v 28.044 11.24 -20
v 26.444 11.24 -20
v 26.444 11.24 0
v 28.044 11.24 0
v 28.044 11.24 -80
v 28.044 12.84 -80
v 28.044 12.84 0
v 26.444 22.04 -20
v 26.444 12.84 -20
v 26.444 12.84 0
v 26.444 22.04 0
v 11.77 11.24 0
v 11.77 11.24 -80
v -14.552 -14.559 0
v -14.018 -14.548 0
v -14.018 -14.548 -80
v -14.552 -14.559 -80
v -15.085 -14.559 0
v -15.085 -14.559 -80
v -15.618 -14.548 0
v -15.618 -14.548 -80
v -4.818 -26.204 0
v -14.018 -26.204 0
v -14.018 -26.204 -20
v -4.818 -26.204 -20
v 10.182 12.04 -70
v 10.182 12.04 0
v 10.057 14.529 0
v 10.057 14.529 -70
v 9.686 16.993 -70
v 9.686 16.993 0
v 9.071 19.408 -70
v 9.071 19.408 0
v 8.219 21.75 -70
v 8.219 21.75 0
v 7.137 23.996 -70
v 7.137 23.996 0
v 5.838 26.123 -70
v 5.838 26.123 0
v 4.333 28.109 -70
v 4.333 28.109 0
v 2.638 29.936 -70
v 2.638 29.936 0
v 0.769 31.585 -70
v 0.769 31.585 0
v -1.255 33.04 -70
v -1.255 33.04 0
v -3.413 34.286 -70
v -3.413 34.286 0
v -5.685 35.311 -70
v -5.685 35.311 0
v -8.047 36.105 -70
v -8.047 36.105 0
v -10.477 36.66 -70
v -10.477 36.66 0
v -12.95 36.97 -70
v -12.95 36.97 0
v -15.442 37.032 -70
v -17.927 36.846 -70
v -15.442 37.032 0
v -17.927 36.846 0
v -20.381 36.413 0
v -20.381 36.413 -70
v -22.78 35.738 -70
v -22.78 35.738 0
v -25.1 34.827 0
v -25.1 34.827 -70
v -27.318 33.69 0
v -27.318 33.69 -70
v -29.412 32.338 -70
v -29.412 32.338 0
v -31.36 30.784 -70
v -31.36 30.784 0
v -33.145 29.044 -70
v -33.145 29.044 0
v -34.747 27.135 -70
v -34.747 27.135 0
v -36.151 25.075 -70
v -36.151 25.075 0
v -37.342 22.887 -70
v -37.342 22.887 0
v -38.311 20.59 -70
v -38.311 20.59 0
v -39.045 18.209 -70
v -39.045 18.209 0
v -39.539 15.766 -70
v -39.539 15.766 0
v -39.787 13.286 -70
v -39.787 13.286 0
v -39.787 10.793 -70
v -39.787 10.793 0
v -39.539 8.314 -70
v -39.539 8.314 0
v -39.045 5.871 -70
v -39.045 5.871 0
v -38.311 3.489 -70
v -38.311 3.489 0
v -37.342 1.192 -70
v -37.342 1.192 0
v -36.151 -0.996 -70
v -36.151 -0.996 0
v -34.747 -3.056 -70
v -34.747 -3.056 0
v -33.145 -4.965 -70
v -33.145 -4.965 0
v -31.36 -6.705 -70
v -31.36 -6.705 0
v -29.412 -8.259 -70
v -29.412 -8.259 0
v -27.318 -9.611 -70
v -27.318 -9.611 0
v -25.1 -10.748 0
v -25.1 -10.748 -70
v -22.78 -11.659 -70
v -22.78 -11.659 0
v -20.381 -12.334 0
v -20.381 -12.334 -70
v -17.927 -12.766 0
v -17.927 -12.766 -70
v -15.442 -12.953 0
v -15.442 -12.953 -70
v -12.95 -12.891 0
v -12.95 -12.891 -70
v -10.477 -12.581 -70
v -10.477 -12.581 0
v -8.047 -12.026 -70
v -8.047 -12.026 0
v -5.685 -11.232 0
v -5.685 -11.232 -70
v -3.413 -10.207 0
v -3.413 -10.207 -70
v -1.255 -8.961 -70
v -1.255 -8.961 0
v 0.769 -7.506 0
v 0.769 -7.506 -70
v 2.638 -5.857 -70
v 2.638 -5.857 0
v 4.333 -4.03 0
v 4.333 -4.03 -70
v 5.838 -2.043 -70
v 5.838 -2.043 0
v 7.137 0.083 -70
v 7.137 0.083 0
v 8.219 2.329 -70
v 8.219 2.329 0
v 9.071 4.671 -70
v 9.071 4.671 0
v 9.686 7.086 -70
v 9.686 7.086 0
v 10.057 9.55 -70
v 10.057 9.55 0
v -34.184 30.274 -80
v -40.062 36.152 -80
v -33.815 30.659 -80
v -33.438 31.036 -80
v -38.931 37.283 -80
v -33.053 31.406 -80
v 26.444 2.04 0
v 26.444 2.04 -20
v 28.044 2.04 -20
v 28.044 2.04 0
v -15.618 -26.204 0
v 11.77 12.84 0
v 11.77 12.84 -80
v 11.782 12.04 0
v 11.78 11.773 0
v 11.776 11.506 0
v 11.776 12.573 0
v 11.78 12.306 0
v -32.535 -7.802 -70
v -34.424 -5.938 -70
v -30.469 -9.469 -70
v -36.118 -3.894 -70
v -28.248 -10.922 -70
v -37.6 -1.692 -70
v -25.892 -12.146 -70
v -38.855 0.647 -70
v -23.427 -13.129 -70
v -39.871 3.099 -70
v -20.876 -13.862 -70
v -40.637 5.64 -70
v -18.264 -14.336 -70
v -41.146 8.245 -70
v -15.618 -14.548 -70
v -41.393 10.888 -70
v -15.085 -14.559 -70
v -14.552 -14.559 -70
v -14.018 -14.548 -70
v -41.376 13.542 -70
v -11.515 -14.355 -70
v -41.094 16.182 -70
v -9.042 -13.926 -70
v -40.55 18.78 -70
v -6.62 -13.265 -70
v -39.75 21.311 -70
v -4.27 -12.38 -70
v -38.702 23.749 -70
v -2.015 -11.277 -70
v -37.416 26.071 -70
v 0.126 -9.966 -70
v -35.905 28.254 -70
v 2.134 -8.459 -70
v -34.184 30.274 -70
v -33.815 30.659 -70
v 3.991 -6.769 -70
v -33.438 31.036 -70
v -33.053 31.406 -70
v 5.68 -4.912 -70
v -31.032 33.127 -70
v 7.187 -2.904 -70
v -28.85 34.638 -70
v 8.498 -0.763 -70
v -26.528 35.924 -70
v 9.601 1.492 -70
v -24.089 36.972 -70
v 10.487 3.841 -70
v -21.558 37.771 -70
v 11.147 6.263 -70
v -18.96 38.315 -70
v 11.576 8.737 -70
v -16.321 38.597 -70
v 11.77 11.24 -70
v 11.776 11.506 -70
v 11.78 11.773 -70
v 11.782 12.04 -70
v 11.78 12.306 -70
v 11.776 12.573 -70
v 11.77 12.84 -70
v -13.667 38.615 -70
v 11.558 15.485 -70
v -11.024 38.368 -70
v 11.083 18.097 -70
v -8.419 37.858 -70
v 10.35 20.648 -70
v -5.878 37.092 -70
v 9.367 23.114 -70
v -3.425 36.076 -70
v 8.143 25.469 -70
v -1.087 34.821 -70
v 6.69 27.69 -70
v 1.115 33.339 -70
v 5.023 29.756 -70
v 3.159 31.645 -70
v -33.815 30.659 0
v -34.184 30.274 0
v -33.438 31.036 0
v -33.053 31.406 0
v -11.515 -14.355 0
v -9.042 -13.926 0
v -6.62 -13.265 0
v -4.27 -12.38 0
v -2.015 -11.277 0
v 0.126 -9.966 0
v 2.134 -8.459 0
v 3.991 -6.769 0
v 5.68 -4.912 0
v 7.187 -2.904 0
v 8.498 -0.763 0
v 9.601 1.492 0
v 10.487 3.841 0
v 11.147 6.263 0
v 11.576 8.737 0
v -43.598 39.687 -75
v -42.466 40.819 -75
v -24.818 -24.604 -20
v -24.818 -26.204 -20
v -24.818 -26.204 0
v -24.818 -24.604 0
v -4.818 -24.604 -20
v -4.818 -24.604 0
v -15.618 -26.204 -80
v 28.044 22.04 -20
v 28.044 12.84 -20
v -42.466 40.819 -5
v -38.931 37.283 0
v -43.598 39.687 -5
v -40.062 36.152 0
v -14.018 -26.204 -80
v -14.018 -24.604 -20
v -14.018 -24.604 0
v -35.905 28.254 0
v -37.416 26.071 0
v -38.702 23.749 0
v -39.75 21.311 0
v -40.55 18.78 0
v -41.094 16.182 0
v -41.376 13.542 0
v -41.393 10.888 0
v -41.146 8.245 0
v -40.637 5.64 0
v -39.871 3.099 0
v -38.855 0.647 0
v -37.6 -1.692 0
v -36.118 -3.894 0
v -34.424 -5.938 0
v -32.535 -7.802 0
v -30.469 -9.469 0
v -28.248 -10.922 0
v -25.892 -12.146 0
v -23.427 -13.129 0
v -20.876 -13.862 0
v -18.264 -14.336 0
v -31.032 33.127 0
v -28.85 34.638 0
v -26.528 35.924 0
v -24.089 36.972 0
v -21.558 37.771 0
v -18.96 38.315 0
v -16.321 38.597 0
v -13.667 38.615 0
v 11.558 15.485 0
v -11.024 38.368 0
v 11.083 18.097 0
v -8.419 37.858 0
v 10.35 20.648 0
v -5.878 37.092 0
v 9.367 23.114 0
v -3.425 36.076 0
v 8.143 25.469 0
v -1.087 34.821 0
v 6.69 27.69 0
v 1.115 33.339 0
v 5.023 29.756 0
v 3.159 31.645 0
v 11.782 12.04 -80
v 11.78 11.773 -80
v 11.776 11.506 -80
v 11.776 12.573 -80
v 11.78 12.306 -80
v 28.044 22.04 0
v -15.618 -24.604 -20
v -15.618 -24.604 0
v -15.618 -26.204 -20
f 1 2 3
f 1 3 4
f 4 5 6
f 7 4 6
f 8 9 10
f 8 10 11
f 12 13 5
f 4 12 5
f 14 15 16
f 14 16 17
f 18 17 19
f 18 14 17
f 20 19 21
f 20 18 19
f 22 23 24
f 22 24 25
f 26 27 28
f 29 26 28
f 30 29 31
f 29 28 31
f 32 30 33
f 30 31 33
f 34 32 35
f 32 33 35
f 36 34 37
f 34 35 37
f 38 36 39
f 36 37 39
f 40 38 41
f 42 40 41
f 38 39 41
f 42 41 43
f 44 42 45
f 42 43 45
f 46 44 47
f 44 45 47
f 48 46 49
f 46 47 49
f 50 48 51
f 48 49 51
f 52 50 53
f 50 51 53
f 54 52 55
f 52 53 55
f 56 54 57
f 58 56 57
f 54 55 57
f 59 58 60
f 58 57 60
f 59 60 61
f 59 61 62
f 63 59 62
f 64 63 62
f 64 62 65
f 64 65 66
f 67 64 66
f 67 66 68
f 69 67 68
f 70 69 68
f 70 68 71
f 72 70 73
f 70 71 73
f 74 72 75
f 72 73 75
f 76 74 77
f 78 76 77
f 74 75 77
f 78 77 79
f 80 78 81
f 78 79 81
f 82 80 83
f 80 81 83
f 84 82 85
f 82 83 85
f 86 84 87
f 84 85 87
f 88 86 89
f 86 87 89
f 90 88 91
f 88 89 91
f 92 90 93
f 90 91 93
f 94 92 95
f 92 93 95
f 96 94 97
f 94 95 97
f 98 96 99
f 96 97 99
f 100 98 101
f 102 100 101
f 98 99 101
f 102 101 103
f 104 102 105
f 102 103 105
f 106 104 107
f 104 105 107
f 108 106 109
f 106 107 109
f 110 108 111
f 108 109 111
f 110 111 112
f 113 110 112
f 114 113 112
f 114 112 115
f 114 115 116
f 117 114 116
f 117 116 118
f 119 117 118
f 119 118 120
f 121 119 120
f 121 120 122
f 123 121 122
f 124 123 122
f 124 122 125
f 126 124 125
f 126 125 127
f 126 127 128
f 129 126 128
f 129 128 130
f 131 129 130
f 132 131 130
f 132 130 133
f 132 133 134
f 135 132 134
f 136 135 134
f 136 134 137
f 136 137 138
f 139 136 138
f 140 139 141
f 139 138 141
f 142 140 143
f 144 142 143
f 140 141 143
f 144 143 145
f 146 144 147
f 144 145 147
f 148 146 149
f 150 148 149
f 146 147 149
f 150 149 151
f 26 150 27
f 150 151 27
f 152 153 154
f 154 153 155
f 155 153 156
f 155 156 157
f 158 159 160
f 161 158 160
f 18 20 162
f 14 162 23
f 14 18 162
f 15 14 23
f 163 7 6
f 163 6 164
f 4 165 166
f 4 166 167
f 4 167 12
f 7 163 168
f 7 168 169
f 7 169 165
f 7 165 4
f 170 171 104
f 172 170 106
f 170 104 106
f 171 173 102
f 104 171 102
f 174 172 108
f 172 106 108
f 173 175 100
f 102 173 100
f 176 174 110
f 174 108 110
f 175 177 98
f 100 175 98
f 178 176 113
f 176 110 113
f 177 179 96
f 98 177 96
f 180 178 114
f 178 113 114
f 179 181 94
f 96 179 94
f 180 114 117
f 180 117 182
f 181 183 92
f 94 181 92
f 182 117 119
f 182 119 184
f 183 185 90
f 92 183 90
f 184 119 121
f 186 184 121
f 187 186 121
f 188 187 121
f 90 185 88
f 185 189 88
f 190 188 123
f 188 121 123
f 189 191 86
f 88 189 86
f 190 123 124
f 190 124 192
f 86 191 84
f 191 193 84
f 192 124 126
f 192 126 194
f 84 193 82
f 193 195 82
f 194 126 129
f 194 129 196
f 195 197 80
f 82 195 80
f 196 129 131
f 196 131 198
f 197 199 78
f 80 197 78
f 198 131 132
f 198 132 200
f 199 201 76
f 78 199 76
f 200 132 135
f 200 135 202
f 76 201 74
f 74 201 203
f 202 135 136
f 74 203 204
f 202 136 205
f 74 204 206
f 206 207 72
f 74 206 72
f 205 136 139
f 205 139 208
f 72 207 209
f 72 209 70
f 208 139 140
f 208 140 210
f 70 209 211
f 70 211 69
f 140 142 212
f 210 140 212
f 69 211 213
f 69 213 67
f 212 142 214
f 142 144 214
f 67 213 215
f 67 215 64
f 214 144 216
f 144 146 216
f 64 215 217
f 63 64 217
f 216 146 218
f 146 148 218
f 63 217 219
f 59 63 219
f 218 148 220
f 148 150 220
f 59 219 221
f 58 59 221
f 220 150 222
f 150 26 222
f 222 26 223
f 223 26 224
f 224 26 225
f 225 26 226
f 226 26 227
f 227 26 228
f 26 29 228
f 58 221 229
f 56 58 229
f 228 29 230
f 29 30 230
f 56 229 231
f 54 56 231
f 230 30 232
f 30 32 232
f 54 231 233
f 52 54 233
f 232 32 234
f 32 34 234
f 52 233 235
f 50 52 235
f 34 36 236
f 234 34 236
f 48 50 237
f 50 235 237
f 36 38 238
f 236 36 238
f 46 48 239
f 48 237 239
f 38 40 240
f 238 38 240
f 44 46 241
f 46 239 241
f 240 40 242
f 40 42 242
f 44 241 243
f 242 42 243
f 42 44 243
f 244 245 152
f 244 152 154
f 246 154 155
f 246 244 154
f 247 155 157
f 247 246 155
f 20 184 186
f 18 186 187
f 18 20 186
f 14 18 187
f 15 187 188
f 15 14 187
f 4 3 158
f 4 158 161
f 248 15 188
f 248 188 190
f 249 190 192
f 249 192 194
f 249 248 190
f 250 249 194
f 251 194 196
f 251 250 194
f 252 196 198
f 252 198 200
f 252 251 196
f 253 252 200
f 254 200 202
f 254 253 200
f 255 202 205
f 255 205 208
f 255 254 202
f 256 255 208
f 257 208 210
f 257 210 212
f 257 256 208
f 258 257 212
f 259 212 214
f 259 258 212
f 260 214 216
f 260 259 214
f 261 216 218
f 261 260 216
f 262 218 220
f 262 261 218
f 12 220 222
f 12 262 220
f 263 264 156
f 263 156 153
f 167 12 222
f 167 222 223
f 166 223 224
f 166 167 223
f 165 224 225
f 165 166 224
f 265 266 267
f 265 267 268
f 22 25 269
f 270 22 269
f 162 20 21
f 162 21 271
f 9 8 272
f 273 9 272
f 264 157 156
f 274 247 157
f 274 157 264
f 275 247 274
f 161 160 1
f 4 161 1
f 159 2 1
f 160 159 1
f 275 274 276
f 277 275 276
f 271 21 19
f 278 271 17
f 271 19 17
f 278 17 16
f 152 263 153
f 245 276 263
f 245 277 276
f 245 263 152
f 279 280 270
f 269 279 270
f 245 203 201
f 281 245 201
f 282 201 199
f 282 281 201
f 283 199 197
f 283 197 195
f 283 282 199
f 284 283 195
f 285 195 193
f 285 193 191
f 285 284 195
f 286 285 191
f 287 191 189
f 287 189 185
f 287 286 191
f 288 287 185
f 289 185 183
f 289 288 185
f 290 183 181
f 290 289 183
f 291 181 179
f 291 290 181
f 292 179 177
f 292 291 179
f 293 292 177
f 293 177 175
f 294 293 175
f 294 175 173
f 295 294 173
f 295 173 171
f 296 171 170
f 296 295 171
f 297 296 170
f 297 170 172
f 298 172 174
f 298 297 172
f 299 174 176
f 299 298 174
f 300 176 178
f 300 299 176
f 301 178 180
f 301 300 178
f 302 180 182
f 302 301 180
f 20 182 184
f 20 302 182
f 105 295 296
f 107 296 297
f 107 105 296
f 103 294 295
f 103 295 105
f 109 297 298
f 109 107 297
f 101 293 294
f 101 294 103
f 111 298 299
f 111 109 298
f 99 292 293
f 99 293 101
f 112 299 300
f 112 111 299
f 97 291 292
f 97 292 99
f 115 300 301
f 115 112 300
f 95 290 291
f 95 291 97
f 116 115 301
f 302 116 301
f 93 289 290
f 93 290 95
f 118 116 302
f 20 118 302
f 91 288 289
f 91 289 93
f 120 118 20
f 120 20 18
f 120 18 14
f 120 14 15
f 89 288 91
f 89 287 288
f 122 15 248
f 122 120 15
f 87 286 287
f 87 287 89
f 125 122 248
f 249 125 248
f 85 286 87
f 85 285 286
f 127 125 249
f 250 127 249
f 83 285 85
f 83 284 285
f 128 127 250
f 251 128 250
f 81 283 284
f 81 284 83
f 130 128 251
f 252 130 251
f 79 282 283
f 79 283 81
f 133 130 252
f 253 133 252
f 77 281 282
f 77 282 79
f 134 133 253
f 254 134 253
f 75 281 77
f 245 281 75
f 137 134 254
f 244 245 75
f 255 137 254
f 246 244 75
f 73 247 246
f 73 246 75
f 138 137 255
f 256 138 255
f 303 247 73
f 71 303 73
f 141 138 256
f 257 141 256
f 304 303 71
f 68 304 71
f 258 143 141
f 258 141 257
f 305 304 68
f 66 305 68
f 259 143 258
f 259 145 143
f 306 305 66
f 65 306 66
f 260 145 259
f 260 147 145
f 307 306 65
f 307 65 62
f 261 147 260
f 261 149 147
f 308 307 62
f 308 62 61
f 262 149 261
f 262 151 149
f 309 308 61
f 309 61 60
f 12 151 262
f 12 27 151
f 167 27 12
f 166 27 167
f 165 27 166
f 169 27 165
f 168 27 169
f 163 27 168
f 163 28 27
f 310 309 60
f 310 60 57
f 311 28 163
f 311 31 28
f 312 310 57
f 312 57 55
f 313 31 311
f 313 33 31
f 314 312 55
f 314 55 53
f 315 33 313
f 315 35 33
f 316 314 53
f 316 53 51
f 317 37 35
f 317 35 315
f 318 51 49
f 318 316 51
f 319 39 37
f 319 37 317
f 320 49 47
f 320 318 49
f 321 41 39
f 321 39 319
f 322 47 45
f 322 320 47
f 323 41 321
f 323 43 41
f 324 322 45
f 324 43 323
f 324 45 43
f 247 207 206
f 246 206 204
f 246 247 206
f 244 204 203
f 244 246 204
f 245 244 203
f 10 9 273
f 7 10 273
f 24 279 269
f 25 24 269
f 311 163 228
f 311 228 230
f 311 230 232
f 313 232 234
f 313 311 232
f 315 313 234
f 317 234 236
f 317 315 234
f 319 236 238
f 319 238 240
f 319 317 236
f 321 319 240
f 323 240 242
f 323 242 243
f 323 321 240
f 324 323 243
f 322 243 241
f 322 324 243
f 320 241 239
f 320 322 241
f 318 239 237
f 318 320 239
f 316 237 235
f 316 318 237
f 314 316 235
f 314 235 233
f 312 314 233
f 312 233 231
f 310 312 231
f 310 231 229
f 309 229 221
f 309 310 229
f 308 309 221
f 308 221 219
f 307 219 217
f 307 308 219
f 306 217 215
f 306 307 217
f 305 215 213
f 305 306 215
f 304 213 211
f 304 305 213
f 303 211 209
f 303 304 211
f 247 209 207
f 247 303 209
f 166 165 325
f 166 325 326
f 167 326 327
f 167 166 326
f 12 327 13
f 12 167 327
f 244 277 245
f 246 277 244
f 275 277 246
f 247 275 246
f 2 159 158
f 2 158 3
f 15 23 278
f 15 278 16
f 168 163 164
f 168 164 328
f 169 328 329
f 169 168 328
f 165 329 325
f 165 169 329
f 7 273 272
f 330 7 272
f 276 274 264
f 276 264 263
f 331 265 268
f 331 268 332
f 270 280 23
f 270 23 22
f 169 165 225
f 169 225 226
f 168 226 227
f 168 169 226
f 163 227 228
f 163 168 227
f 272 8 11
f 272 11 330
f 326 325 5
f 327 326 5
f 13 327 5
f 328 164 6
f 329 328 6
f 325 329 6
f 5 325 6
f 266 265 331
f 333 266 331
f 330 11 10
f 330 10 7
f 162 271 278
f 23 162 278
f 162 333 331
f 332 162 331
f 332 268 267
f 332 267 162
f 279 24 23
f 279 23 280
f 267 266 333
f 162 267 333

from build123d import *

# Parameters (mm, degrees)
F1_DEPTH = 80
F0_W     = 1.6
F0_H     = 1.6
F0_R     = 25
F2_DEPTH = 70
F3_SIZE  = 5
F0_W_2   = 9.2
F4_DEPTH = 20
F0_H_2   = 9.2


with BuildPart() as f1:
    # F0 (on Top) → F1 (new body)
    with BuildSketch(Plane.XY):
        with BuildLine():
            ThreePointArc((-34.1844936712, 30.2744241403), (-33.6273167185, 30.8486180375), (-33.0531228213, 31.4057949902))
            Line((-33.0531228213, 31.4057949902), (-42.4661514833, 40.8188236522))
            Line((-42.4661514833, 40.8188236522), (-43.5975223332, 39.6874528023))
            Line((-43.5975223332, 39.6874528023), (-34.1844936712, 30.2744241403))
        make_face()
    extrude(amount=-F1_DEPTH)

    # F3
    f3_edges = [f1.edges().sort_by_distance(p)[0] for p in [
        (-43.031837, 40.253138, -80),
        (-43.031837, 40.253138, 0),
    ]]
    chamfer(f3_edges, length=F3_SIZE)


with BuildPart() as f1b:
    # F0 (on Top) → F1, piece 2 (new body)
    with BuildSketch(Plane.XY):
        with BuildLine():
            Line((-14.0182763389, -24.6038896912), (-14.0182763389, -14.5483895453))
            ThreePointArc((-14.0182763389, -14.5483895453), (-14.8182763389, -14.5604223421), (-15.6182763389, -14.5483895453))
            Line((-15.6182763389, -14.5483895453), (-15.6182763389, -24.6038896912))
            Line((-15.6182763389, -24.6038896912), (-14.0182763389, -24.6038896912))
        make_face()
        with Locations((-14.8182763389, -25.4038896912)):
            Rectangle(F0_W, F0_H)
    extrude(amount=-F1_DEPTH)


with BuildPart() as f1c:
    # F0 (on Top) → F1, piece 3 (new body)
    with BuildSketch(Plane.XY):
        with BuildLine():
            ThreePointArc((11.7696908643, 12.8395776579), (11.7787152918, 12.4396229017), (11.7817236611, 12.0395776579))
            ThreePointArc((11.7817236611, 12.0395776579), (11.7787152918, 11.6395324142), (11.7696908643, 11.2395776579))
            Line((11.7696908643, 11.2395776579), (26.4436644382, 11.2395776579))
            Line((26.4436644382, 11.2395776579), (26.4436644382, 12.8395776579))
            Line((26.4436644382, 12.8395776579), (11.7696908643, 12.8395776579))
        make_face()
        with Locations((27.2436644382, 12.0395776579)):
            Rectangle(F0_W, F0_H)
    extrude(amount=-F1_DEPTH)


with BuildPart() as f2:
    # F0 (on Top) → F2 (new body)
    with BuildSketch(Plane.XY):
        with BuildLine():
            ThreePointArc((11.7696908643, 11.2395776579), (11.7787152918, 11.6395324142), (11.7817236611, 12.0395776579))
            ThreePointArc((11.7817236611, 12.0395776579), (11.7787152918, 12.4396229017), (11.7696908643, 12.8395776579))
            ThreePointArc((11.7696908643, 12.8395776579), (-4.638897038, 36.6147732227), (-33.0531228213, 31.4057949902))
            ThreePointArc((-33.0531228213, 31.4057949902), (-33.6273167185, 30.8486180375), (-34.1844936712, 30.2744241403))
            ThreePointArc((-34.1844936712, 30.2744241403), (-39.3934719037, 1.860198357), (-15.6182763389, -14.5483895453))
            ThreePointArc((-15.6182763389, -14.5483895453), (-14.8182763389, -14.5604223421), (-14.0182763389, -14.5483895453))
            ThreePointArc((-14.0182763389, -14.5483895453), (3.9907640406, -6.7694627217), (11.7696908643, 11.2395776579))
        make_face()
        with Locations((-14.8182763389, 12.0395776579)):
            Circle(F0_R, mode=Mode.SUBTRACT)
    extrude(amount=-F2_DEPTH)


with BuildPart() as f4:
    # F0 (on Top) → F4 (new body)
    with BuildSketch(Plane.XY):
        with Locations((-20.2182763389, -25.4038896912)):
            Rectangle(F0_W_2, F0_H)
    extrude(amount=-F4_DEPTH)


with BuildPart() as f4b:
    # F0 (on Top) → F4, piece 2 (new body)
    with BuildSketch(Plane.XY):
        with Locations((-9.4182763389, -25.4038896912)):
            Rectangle(F0_W_2, F0_H)
    extrude(amount=-F4_DEPTH)


with BuildPart() as f4c:
    # F0 (on Top) → F4, piece 3 (new body)
    with BuildSketch(Plane.XY):
        with Locations((27.2436644382, 6.6395776579)):
            Rectangle(F0_W, F0_H_2)
    extrude(amount=-F4_DEPTH)


with BuildPart() as f4d:
    # F0 (on Top) → F4, piece 4 (new body)
    with BuildSketch(Plane.XY):
        with Locations((27.2436644382, 17.4395776579)):
            Rectangle(F0_W, F0_H_2)
    extrude(amount=-F4_DEPTH)


solid = Compound([f1.part, f1b.part, f1c.part, f2.part, f4.part, f4b.part, f4c.part, f4d.part])
